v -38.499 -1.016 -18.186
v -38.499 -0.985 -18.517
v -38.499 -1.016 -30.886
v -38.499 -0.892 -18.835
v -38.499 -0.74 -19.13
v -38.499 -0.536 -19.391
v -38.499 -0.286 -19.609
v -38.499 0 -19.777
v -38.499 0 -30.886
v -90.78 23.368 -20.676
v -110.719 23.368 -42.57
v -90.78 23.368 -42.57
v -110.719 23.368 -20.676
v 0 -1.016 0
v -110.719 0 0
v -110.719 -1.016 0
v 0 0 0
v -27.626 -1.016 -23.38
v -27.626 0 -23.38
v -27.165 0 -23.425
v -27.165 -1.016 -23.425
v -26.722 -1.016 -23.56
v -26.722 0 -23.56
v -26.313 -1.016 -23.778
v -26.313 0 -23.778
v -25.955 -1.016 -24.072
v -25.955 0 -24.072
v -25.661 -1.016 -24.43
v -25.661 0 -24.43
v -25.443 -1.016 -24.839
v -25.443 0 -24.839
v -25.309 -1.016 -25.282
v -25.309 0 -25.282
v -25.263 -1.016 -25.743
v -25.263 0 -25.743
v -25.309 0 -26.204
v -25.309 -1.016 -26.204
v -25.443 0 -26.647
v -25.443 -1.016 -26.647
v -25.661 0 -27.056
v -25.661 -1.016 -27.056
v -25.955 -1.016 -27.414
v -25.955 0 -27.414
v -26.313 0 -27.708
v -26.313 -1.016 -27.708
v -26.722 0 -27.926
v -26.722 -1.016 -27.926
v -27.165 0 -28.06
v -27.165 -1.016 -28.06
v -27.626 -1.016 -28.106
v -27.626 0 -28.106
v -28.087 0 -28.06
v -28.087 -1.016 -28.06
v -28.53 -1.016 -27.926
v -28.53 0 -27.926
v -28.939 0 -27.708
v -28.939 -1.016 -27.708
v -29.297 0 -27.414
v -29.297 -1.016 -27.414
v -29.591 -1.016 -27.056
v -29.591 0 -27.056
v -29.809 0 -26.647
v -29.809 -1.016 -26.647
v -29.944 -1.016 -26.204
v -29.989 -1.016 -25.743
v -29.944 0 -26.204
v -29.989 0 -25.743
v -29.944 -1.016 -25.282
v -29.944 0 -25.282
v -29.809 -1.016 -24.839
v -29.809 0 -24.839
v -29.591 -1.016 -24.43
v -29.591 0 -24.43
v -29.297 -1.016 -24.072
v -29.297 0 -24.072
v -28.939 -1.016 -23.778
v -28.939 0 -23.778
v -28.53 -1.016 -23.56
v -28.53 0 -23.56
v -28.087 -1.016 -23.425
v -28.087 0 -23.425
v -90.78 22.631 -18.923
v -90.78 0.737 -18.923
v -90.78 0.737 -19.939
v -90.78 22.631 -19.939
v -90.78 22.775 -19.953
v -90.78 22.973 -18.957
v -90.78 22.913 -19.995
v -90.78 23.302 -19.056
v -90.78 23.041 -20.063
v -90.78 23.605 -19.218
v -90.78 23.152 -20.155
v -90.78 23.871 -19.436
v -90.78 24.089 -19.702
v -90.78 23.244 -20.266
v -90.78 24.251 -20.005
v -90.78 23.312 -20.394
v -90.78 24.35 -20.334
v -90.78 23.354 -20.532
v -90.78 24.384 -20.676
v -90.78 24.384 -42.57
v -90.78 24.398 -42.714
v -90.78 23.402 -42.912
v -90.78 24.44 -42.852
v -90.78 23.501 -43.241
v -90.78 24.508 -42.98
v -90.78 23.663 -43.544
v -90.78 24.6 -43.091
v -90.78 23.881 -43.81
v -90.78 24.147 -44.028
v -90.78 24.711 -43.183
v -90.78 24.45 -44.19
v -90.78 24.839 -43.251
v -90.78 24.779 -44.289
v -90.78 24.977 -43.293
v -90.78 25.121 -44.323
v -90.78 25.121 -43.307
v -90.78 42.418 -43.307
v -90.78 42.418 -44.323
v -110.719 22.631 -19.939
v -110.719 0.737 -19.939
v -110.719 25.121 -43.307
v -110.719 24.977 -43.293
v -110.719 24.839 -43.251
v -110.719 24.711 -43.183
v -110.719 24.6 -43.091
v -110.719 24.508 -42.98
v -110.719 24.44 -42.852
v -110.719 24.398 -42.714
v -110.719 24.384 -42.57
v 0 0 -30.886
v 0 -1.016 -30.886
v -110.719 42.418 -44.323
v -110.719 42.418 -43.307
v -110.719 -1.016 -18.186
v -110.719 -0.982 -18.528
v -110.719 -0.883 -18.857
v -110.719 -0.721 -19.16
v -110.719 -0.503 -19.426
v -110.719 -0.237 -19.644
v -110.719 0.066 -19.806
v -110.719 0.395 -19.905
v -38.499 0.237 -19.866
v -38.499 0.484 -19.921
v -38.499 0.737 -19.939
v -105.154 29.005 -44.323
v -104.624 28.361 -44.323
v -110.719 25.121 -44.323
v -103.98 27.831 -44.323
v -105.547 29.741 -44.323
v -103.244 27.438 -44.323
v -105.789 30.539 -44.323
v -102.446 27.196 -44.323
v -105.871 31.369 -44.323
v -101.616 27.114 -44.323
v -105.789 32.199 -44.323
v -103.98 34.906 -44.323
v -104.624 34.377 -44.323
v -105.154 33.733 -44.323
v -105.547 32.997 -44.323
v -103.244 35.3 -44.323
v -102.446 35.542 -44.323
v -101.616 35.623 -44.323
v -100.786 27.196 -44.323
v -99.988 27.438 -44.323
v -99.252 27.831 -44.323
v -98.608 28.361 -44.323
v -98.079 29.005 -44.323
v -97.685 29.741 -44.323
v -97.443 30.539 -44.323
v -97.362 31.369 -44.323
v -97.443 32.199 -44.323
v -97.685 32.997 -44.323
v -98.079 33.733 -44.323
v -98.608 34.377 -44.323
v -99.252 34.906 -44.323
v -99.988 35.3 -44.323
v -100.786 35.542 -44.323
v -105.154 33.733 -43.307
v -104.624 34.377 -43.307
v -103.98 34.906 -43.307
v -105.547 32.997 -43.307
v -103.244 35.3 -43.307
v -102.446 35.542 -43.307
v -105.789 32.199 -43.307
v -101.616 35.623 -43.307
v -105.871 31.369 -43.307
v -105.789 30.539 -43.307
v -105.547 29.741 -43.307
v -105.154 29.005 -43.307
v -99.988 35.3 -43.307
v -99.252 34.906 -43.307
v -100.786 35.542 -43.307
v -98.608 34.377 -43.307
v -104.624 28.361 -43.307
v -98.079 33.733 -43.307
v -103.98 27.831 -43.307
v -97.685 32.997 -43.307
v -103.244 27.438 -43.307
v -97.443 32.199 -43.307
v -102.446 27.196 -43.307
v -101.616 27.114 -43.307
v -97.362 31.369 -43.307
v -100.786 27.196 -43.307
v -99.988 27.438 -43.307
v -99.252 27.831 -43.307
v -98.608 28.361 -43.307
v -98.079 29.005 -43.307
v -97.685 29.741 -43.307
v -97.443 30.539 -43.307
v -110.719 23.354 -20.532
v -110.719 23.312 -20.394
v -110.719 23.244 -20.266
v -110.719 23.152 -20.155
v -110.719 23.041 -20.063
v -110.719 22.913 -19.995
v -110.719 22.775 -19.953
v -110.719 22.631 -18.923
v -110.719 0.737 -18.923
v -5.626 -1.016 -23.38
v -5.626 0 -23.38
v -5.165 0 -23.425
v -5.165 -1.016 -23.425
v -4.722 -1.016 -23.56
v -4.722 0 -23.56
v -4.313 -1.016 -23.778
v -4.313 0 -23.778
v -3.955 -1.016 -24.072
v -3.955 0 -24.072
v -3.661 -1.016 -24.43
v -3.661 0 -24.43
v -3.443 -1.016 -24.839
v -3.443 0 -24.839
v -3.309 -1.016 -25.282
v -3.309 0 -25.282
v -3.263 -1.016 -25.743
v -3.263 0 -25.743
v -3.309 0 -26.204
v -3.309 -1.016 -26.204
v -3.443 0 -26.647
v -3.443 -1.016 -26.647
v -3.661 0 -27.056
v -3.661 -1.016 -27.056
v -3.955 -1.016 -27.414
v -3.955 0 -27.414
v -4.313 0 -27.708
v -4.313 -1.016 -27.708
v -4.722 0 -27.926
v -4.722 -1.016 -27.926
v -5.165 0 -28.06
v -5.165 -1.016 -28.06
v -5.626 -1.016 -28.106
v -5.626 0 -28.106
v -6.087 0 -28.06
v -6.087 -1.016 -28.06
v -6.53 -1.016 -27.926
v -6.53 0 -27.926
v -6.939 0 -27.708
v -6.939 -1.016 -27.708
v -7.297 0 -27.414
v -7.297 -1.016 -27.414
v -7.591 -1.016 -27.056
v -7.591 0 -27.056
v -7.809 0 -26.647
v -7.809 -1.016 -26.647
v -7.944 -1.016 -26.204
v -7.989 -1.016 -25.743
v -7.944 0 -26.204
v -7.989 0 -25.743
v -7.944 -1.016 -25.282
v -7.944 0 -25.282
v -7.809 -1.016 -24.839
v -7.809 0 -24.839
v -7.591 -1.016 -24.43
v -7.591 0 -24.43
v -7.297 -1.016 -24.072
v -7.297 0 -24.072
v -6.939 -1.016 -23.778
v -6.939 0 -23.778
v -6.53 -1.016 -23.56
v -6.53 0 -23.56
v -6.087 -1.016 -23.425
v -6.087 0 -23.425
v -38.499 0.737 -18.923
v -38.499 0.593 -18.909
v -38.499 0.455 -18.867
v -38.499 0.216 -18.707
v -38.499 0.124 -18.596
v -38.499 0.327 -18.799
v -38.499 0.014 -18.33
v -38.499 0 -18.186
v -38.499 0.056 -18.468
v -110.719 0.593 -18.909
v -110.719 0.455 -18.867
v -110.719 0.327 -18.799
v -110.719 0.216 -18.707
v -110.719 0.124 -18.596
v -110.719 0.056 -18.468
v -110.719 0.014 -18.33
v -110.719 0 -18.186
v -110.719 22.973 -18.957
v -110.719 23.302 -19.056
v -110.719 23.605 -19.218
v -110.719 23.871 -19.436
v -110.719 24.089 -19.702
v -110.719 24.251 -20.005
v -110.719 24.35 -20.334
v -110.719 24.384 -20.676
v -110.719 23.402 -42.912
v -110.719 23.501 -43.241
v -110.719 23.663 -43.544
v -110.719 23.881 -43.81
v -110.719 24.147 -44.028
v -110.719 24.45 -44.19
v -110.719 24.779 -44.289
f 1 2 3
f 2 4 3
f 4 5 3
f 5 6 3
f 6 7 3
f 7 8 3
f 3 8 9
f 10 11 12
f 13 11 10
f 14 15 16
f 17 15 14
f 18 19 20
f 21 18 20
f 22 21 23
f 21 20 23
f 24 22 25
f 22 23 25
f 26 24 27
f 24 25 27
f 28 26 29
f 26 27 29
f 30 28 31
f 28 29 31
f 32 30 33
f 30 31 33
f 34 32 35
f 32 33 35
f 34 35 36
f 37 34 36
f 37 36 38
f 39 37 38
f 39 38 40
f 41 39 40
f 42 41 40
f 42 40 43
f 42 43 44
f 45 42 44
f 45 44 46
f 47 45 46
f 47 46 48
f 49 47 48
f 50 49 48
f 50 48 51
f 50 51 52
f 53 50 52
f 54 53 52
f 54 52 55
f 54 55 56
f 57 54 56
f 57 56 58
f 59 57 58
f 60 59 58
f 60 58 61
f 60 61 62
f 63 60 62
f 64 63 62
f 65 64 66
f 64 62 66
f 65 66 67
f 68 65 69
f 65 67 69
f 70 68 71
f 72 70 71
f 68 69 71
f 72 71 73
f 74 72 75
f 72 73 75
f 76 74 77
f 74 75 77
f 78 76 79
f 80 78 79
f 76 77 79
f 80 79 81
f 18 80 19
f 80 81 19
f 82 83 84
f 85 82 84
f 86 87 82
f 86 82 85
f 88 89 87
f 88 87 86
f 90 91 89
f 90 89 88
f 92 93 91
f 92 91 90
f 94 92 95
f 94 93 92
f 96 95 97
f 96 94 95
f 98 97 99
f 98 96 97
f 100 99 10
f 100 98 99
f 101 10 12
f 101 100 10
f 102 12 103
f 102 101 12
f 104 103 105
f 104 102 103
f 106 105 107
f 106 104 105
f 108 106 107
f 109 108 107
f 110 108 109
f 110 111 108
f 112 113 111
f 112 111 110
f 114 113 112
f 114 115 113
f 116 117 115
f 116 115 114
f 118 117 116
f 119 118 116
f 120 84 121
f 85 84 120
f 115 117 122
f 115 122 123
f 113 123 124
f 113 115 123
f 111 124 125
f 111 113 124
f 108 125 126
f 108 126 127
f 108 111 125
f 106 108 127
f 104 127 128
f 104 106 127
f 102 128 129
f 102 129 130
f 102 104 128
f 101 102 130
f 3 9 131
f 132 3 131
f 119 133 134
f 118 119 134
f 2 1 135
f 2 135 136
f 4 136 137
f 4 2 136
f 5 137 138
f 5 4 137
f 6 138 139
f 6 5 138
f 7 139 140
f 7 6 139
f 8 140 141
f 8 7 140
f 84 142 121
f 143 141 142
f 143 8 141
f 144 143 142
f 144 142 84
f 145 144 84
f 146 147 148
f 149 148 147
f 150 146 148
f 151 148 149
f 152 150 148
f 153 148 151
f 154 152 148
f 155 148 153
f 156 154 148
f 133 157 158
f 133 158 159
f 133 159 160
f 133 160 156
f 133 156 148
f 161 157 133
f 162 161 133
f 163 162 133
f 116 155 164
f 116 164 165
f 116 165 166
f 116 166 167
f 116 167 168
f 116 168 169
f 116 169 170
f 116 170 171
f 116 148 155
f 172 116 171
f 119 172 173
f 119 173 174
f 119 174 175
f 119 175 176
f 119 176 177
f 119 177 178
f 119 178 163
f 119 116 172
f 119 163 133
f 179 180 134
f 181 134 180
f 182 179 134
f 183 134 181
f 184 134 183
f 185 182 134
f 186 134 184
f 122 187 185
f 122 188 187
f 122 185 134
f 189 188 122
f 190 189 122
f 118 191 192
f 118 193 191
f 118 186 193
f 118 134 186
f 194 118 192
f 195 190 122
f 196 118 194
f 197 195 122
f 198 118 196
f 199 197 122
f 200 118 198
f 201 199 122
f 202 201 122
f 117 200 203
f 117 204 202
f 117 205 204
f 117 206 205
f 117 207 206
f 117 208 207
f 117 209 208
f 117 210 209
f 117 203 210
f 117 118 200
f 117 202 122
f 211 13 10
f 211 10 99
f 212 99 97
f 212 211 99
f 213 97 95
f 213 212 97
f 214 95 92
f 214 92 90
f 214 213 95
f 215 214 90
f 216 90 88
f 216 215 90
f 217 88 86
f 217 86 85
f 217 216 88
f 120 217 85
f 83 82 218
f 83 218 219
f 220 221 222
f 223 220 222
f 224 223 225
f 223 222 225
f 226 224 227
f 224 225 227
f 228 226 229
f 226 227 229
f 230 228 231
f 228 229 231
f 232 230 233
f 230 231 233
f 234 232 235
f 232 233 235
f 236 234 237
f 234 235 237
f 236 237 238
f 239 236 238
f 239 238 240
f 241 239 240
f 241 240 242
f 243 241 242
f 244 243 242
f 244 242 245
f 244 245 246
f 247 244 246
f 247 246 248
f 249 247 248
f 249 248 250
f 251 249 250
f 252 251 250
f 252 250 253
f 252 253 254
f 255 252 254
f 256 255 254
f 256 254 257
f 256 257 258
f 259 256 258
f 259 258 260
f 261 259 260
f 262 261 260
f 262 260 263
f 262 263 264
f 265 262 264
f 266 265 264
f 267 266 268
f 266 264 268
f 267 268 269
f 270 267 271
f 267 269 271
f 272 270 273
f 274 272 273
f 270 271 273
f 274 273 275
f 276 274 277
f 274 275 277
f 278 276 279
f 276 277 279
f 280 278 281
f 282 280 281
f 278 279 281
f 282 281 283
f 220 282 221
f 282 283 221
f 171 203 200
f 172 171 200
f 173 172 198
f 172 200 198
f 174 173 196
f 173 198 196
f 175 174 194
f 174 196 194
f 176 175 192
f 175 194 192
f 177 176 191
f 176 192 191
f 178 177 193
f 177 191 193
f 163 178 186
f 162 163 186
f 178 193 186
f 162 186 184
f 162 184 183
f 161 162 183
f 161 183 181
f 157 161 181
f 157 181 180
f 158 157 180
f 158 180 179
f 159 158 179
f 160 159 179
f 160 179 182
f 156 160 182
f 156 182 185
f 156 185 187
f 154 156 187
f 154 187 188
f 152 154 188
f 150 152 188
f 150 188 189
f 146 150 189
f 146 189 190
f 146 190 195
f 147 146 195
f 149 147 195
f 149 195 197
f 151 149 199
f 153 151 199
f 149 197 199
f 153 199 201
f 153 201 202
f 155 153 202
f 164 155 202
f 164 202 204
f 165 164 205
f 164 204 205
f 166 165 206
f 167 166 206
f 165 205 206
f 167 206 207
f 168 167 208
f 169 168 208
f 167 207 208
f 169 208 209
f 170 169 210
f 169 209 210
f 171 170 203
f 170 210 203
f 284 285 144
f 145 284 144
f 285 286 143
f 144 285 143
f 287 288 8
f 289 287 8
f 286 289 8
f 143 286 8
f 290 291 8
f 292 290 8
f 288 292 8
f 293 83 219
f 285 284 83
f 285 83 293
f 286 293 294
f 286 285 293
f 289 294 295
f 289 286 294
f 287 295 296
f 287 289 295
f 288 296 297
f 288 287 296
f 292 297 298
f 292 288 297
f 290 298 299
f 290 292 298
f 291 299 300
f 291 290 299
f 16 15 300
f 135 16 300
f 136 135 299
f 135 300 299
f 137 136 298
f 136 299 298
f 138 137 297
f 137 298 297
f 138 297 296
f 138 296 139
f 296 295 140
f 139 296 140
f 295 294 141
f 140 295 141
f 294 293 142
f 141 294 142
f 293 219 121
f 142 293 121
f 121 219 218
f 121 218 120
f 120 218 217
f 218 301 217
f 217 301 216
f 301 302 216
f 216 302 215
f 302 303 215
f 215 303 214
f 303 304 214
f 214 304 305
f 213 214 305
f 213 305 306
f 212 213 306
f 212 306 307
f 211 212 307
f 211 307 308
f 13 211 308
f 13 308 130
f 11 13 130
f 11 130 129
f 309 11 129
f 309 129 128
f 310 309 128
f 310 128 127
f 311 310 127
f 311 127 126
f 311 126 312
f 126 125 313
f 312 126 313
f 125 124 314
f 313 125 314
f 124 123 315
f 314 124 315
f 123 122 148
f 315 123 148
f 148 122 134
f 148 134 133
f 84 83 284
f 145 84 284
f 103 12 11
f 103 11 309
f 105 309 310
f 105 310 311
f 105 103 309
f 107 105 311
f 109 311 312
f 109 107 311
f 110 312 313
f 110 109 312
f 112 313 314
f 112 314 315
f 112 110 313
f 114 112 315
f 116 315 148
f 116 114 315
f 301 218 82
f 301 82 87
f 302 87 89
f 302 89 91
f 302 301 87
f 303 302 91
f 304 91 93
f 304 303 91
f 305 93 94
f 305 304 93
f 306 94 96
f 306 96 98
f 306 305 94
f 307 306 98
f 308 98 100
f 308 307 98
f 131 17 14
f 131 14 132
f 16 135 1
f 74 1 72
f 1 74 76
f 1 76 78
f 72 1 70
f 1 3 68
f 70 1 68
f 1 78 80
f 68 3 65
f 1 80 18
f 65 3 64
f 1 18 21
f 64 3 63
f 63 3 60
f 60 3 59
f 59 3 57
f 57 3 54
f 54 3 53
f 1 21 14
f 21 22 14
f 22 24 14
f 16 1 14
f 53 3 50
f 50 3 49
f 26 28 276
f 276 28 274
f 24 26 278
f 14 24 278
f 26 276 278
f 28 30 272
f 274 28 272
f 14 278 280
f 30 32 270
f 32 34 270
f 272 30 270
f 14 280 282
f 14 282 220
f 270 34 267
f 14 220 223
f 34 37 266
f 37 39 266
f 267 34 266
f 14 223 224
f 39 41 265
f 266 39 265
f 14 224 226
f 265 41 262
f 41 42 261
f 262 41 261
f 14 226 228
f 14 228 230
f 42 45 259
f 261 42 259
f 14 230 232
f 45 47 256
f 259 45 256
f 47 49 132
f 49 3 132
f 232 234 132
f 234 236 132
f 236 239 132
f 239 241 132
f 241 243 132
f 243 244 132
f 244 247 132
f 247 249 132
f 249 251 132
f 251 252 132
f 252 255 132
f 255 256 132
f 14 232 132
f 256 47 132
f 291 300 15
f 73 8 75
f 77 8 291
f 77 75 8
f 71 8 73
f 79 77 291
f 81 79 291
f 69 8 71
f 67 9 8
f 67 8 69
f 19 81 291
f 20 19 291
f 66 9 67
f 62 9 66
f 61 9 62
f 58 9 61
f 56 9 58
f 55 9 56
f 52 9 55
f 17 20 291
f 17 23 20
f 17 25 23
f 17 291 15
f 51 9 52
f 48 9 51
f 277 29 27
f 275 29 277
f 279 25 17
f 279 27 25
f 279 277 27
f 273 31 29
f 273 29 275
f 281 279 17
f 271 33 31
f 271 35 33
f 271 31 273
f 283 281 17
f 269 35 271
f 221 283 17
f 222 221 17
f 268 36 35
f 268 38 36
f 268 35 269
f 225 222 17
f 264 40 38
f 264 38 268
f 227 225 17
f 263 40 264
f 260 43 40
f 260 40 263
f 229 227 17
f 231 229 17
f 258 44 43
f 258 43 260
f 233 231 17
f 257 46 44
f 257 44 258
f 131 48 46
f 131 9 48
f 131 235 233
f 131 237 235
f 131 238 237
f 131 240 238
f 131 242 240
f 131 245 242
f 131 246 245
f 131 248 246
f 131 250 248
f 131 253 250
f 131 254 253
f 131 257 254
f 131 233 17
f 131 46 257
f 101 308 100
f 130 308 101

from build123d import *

# Parameters (mm, degrees)
SKETCH1_W                    = 110.7186
SKETCH1_H                    = 19.939
BASE_FLANGE1_DEPTH           = 1.016
EDGE_FLANGE1_STRIP_W         = 5.5372
EDGE_FLANGE1_STRIP_H         = 1.016
EDGE_FLANGE1_STRIP_CUT_DEPTH = 110.7186
EDGE_FLANGE1_DEPTH           = 110.7186
CUT_EXTRUDE1_REACH           = 116.94
SKETCH9_W                    = 90.7796
SKETCH9_H                    = 23.6474
EDGE_FLANGE2_STRIP_W         = 5.5372
EDGE_FLANGE2_STRIP_H         = 1.016
EDGE_FLANGE2_STRIP_CUT_DEPTH = 19.939
EDGE_FLANGE2_DEPTH           = 19.939
EDGE_FLANGE3_STRIP_W         = 5.5372
EDGE_FLANGE3_STRIP_H         = 1.016
EDGE_FLANGE3_STRIP_CUT_DEPTH = 19.939
EDGE_FLANGE3_DEPTH           = 19.939
CUT_EXTRUDE2_DEPTH           = 2.54
CUT_EXTRUDE2_DEPTH_BACK      = 2.54
SKETCH17_W                   = 38.49878
SKETCH17_H                   = 1.7526
SKETCH16_W                   = 38.49878
SKETCH16_H                   = 12.7
TAB2_DEPTH                   = 1.016
CUT_EXTRUDE3_REACH           = 128.228
SKETCH20_R                   = 4.2545
CUT_EXTRUDE4_REACH           = 128.58
SKETCH21_R                   = 2.36295848


# Sheet-metal steps are written as plain solids
with BuildPart() as part:
    # Sketch1 → Base-Flange1 (new body)
    with BuildSketch(Plane(origin=(0, 0, 0), x_dir=(1, 0, 0), z_dir=(0, 1, 0))):
        with Locations((-55.3593, 9.9695)):
            Rectangle(SKETCH1_W, SKETCH1_H)
    extrude(amount=-BASE_FLANGE1_DEPTH)

    # Edge-Flange1 strip (across the edge) → Edge-Flange1 strip cut (cut)
    with BuildSketch(Plane(origin=(0, 0, -19.939), x_dir=(0, 0, 1), z_dir=(-1, 0, 0))):
        with Locations((-1.016, -0.508)):
            Rectangle(EDGE_FLANGE1_STRIP_W, EDGE_FLANGE1_STRIP_H)
    extrude(amount=EDGE_FLANGE1_STRIP_CUT_DEPTH, mode=Mode.SUBTRACT)

    # Edge-Flange1 section (across the edge) → Edge-Flange1 (add)
    with BuildSketch(Plane(origin=(0, 0, -19.939), x_dir=(0, 0, 1), z_dir=(-1, 0, 0))):
        with BuildLine():
            Line((0, 0.7366), (0, 24.384))
            Line((0, 24.384), (1.016, 24.384))
            Line((1.016, 24.384), (1.016, 0.7366))
            ThreePointArc((1.016, 0.7366), (1.231745145, 0.215745145), (1.7526, 0))
            Line((1.7526, 0), (1.7526, -1.016))
            ThreePointArc((1.7526, -1.016), (0.513324655, -0.502675345), (0, 0.7366))
        make_face()
    extrude(amount=EDGE_FLANGE1_DEPTH)

    # Sketch9 → Cut-Extrude1 (cut, up to next)
    with BuildSketch(Plane.XY.offset(-18.923), mode=Mode.PRIVATE) as cut_extrude1_sk1:
        with Locations((-45.3898, 12.5603)):
            Rectangle(SKETCH9_W, SKETCH9_H)
    cut_extrude1_tool1 = extrude(cut_extrude1_sk1.sketch, amount=-CUT_EXTRUDE1_REACH, mode=Mode.PRIVATE) & part.part
    add(cut_extrude1_tool1.solids().sort_by_distance((-45.3898, 12.5603, -18.923))[0], mode=Mode.SUBTRACT)

    # Edge-Flange2 strip (across the edge) → Edge-Flange2 strip cut (cut)
    with BuildSketch(Plane(origin=(-110.7186, 24.384, -19.939), x_dir=(0, -1, 0), z_dir=(1, 0, 0))):
        with Locations((-1.016, -0.508)):
            Rectangle(EDGE_FLANGE2_STRIP_W, EDGE_FLANGE2_STRIP_H)
    extrude(amount=EDGE_FLANGE2_STRIP_CUT_DEPTH, mode=Mode.SUBTRACT)

    # Edge-Flange2 section (across the edge) → Edge-Flange2 (add)
    with BuildSketch(Plane(origin=(-110.7186, 24.384, -19.939), x_dir=(0, -1, 0), z_dir=(1, 0, 0))):
        with BuildLine():
            Line((0, 0.7366), (0, 24.384))
            Line((0, 24.384), (1.016, 24.384))
            Line((1.016, 24.384), (1.016, 0.7366))
            ThreePointArc((1.016, 0.7366), (1.231745145, 0.215745145), (1.7526, 0))
            Line((1.7526, 0), (1.7526, -1.016))
            ThreePointArc((1.7526, -1.016), (0.513324655, -0.502675345), (0, 0.7366))
        make_face()
    extrude(amount=EDGE_FLANGE2_DEPTH)

    # Edge-Flange3 strip (across the edge) → Edge-Flange3 strip cut (cut)
    with BuildSketch(Plane(origin=(-90.7796, 24.384, -44.323), x_dir=(0, 0, 1), z_dir=(-1, 0, 0))):
        with Locations((-1.016, -0.508)):
            Rectangle(EDGE_FLANGE3_STRIP_W, EDGE_FLANGE3_STRIP_H)
    extrude(amount=EDGE_FLANGE3_STRIP_CUT_DEPTH, mode=Mode.SUBTRACT)

    # Edge-Flange3 section (across the edge) → Edge-Flange3 (add)
    with BuildSketch(Plane(origin=(-90.7796, 24.384, -44.323), x_dir=(0, 0, 1), z_dir=(-1, 0, 0))):
        with BuildLine():
            Line((0, 0.7366), (0, 18.034))
            Line((0, 18.034), (1.016, 18.034))
            Line((1.016, 18.034), (1.016, 0.7366))
            ThreePointArc((1.016, 0.7366), (1.231745145, 0.215745145), (1.7526, 0))
            Line((1.7526, 0), (1.7526, -1.016))
            ThreePointArc((1.7526, -1.016), (0.513324655, -0.502675345), (0, 0.7366))
        make_face()
    extrude(amount=EDGE_FLANGE3_DEPTH)

    # Sketch17 → Cut-Extrude2 (cut, two sides: drawn at the far end of the back side and taken through both)
    with BuildSketch(Plane(origin=(0, 0, 0), x_dir=(1, 0, 0), z_dir=(0, 1, 0)).offset(-CUT_EXTRUDE2_DEPTH_BACK)):
        with Locations((-19.24939, 19.0627)):
            Rectangle(SKETCH17_W, SKETCH17_H)
    extrude(amount=CUT_EXTRUDE2_DEPTH + CUT_EXTRUDE2_DEPTH_BACK, mode=Mode.SUBTRACT)

    # Sketch16 → Tab2 (add)
    with BuildSketch(Plane(origin=(0, 0, 0), x_dir=(1, 0, 0), z_dir=(0, 1, 0))):
        with Locations((-19.24939, 24.5364)):
            Rectangle(SKETCH16_W, SKETCH16_H)
    extrude(amount=-TAB2_DEPTH)

    # Sketch20 → Cut-Extrude3 (cut, up to next)
    with BuildSketch(Plane.XY.offset(-43.307), mode=Mode.PRIVATE) as cut_extrude3_sk1:
        with Locations((-101.6161, 31.368930224)):
            Circle(SKETCH20_R)
    cut_extrude3_tool1 = extrude(cut_extrude3_sk1.sketch, amount=-CUT_EXTRUDE3_REACH, mode=Mode.PRIVATE) & part.part
    add(cut_extrude3_tool1.solids().sort_by_distance((-101.6161, 31.36893, -43.307))[0], mode=Mode.SUBTRACT)

    # Sketch21 → Cut-Extrude4 (cut, up to next)
    with BuildSketch(Plane(origin=(0, 0, 0), x_dir=(1, 0, 0), z_dir=(0, 1, 0)), mode=Mode.PRIVATE) as cut_extrude4_sk1:
        with Locations(Location((-27.6261, 25.7429, 0), (0, 0, 270))):
            Circle(SKETCH21_R)
    cut_extrude4_tool1 = extrude(cut_extrude4_sk1.sketch, amount=-CUT_EXTRUDE4_REACH, mode=Mode.PRIVATE) & part.part
    # Sketch21 → Cut-Extrude4 (cut, up to next)
    with BuildSketch(Plane(origin=(0, 0, 0), x_dir=(1, 0, 0), z_dir=(0, 1, 0)), mode=Mode.PRIVATE) as cut_extrude4_sk2:
        with Locations(Location((-5.6261, 25.7429, 0), (0, 0, 270))):
            Circle(SKETCH21_R)
    cut_extrude4_tool2 = extrude(cut_extrude4_sk2.sketch, amount=-CUT_EXTRUDE4_REACH, mode=Mode.PRIVATE) & part.part
    add(cut_extrude4_tool1.solids().sort_by_distance((-27.6261, 0, -25.7429))[0], mode=Mode.SUBTRACT)
    add(cut_extrude4_tool2.solids().sort_by_distance((-5.6261, 0, -25.7429))[0], mode=Mode.SUBTRACT)


solid = part.part
